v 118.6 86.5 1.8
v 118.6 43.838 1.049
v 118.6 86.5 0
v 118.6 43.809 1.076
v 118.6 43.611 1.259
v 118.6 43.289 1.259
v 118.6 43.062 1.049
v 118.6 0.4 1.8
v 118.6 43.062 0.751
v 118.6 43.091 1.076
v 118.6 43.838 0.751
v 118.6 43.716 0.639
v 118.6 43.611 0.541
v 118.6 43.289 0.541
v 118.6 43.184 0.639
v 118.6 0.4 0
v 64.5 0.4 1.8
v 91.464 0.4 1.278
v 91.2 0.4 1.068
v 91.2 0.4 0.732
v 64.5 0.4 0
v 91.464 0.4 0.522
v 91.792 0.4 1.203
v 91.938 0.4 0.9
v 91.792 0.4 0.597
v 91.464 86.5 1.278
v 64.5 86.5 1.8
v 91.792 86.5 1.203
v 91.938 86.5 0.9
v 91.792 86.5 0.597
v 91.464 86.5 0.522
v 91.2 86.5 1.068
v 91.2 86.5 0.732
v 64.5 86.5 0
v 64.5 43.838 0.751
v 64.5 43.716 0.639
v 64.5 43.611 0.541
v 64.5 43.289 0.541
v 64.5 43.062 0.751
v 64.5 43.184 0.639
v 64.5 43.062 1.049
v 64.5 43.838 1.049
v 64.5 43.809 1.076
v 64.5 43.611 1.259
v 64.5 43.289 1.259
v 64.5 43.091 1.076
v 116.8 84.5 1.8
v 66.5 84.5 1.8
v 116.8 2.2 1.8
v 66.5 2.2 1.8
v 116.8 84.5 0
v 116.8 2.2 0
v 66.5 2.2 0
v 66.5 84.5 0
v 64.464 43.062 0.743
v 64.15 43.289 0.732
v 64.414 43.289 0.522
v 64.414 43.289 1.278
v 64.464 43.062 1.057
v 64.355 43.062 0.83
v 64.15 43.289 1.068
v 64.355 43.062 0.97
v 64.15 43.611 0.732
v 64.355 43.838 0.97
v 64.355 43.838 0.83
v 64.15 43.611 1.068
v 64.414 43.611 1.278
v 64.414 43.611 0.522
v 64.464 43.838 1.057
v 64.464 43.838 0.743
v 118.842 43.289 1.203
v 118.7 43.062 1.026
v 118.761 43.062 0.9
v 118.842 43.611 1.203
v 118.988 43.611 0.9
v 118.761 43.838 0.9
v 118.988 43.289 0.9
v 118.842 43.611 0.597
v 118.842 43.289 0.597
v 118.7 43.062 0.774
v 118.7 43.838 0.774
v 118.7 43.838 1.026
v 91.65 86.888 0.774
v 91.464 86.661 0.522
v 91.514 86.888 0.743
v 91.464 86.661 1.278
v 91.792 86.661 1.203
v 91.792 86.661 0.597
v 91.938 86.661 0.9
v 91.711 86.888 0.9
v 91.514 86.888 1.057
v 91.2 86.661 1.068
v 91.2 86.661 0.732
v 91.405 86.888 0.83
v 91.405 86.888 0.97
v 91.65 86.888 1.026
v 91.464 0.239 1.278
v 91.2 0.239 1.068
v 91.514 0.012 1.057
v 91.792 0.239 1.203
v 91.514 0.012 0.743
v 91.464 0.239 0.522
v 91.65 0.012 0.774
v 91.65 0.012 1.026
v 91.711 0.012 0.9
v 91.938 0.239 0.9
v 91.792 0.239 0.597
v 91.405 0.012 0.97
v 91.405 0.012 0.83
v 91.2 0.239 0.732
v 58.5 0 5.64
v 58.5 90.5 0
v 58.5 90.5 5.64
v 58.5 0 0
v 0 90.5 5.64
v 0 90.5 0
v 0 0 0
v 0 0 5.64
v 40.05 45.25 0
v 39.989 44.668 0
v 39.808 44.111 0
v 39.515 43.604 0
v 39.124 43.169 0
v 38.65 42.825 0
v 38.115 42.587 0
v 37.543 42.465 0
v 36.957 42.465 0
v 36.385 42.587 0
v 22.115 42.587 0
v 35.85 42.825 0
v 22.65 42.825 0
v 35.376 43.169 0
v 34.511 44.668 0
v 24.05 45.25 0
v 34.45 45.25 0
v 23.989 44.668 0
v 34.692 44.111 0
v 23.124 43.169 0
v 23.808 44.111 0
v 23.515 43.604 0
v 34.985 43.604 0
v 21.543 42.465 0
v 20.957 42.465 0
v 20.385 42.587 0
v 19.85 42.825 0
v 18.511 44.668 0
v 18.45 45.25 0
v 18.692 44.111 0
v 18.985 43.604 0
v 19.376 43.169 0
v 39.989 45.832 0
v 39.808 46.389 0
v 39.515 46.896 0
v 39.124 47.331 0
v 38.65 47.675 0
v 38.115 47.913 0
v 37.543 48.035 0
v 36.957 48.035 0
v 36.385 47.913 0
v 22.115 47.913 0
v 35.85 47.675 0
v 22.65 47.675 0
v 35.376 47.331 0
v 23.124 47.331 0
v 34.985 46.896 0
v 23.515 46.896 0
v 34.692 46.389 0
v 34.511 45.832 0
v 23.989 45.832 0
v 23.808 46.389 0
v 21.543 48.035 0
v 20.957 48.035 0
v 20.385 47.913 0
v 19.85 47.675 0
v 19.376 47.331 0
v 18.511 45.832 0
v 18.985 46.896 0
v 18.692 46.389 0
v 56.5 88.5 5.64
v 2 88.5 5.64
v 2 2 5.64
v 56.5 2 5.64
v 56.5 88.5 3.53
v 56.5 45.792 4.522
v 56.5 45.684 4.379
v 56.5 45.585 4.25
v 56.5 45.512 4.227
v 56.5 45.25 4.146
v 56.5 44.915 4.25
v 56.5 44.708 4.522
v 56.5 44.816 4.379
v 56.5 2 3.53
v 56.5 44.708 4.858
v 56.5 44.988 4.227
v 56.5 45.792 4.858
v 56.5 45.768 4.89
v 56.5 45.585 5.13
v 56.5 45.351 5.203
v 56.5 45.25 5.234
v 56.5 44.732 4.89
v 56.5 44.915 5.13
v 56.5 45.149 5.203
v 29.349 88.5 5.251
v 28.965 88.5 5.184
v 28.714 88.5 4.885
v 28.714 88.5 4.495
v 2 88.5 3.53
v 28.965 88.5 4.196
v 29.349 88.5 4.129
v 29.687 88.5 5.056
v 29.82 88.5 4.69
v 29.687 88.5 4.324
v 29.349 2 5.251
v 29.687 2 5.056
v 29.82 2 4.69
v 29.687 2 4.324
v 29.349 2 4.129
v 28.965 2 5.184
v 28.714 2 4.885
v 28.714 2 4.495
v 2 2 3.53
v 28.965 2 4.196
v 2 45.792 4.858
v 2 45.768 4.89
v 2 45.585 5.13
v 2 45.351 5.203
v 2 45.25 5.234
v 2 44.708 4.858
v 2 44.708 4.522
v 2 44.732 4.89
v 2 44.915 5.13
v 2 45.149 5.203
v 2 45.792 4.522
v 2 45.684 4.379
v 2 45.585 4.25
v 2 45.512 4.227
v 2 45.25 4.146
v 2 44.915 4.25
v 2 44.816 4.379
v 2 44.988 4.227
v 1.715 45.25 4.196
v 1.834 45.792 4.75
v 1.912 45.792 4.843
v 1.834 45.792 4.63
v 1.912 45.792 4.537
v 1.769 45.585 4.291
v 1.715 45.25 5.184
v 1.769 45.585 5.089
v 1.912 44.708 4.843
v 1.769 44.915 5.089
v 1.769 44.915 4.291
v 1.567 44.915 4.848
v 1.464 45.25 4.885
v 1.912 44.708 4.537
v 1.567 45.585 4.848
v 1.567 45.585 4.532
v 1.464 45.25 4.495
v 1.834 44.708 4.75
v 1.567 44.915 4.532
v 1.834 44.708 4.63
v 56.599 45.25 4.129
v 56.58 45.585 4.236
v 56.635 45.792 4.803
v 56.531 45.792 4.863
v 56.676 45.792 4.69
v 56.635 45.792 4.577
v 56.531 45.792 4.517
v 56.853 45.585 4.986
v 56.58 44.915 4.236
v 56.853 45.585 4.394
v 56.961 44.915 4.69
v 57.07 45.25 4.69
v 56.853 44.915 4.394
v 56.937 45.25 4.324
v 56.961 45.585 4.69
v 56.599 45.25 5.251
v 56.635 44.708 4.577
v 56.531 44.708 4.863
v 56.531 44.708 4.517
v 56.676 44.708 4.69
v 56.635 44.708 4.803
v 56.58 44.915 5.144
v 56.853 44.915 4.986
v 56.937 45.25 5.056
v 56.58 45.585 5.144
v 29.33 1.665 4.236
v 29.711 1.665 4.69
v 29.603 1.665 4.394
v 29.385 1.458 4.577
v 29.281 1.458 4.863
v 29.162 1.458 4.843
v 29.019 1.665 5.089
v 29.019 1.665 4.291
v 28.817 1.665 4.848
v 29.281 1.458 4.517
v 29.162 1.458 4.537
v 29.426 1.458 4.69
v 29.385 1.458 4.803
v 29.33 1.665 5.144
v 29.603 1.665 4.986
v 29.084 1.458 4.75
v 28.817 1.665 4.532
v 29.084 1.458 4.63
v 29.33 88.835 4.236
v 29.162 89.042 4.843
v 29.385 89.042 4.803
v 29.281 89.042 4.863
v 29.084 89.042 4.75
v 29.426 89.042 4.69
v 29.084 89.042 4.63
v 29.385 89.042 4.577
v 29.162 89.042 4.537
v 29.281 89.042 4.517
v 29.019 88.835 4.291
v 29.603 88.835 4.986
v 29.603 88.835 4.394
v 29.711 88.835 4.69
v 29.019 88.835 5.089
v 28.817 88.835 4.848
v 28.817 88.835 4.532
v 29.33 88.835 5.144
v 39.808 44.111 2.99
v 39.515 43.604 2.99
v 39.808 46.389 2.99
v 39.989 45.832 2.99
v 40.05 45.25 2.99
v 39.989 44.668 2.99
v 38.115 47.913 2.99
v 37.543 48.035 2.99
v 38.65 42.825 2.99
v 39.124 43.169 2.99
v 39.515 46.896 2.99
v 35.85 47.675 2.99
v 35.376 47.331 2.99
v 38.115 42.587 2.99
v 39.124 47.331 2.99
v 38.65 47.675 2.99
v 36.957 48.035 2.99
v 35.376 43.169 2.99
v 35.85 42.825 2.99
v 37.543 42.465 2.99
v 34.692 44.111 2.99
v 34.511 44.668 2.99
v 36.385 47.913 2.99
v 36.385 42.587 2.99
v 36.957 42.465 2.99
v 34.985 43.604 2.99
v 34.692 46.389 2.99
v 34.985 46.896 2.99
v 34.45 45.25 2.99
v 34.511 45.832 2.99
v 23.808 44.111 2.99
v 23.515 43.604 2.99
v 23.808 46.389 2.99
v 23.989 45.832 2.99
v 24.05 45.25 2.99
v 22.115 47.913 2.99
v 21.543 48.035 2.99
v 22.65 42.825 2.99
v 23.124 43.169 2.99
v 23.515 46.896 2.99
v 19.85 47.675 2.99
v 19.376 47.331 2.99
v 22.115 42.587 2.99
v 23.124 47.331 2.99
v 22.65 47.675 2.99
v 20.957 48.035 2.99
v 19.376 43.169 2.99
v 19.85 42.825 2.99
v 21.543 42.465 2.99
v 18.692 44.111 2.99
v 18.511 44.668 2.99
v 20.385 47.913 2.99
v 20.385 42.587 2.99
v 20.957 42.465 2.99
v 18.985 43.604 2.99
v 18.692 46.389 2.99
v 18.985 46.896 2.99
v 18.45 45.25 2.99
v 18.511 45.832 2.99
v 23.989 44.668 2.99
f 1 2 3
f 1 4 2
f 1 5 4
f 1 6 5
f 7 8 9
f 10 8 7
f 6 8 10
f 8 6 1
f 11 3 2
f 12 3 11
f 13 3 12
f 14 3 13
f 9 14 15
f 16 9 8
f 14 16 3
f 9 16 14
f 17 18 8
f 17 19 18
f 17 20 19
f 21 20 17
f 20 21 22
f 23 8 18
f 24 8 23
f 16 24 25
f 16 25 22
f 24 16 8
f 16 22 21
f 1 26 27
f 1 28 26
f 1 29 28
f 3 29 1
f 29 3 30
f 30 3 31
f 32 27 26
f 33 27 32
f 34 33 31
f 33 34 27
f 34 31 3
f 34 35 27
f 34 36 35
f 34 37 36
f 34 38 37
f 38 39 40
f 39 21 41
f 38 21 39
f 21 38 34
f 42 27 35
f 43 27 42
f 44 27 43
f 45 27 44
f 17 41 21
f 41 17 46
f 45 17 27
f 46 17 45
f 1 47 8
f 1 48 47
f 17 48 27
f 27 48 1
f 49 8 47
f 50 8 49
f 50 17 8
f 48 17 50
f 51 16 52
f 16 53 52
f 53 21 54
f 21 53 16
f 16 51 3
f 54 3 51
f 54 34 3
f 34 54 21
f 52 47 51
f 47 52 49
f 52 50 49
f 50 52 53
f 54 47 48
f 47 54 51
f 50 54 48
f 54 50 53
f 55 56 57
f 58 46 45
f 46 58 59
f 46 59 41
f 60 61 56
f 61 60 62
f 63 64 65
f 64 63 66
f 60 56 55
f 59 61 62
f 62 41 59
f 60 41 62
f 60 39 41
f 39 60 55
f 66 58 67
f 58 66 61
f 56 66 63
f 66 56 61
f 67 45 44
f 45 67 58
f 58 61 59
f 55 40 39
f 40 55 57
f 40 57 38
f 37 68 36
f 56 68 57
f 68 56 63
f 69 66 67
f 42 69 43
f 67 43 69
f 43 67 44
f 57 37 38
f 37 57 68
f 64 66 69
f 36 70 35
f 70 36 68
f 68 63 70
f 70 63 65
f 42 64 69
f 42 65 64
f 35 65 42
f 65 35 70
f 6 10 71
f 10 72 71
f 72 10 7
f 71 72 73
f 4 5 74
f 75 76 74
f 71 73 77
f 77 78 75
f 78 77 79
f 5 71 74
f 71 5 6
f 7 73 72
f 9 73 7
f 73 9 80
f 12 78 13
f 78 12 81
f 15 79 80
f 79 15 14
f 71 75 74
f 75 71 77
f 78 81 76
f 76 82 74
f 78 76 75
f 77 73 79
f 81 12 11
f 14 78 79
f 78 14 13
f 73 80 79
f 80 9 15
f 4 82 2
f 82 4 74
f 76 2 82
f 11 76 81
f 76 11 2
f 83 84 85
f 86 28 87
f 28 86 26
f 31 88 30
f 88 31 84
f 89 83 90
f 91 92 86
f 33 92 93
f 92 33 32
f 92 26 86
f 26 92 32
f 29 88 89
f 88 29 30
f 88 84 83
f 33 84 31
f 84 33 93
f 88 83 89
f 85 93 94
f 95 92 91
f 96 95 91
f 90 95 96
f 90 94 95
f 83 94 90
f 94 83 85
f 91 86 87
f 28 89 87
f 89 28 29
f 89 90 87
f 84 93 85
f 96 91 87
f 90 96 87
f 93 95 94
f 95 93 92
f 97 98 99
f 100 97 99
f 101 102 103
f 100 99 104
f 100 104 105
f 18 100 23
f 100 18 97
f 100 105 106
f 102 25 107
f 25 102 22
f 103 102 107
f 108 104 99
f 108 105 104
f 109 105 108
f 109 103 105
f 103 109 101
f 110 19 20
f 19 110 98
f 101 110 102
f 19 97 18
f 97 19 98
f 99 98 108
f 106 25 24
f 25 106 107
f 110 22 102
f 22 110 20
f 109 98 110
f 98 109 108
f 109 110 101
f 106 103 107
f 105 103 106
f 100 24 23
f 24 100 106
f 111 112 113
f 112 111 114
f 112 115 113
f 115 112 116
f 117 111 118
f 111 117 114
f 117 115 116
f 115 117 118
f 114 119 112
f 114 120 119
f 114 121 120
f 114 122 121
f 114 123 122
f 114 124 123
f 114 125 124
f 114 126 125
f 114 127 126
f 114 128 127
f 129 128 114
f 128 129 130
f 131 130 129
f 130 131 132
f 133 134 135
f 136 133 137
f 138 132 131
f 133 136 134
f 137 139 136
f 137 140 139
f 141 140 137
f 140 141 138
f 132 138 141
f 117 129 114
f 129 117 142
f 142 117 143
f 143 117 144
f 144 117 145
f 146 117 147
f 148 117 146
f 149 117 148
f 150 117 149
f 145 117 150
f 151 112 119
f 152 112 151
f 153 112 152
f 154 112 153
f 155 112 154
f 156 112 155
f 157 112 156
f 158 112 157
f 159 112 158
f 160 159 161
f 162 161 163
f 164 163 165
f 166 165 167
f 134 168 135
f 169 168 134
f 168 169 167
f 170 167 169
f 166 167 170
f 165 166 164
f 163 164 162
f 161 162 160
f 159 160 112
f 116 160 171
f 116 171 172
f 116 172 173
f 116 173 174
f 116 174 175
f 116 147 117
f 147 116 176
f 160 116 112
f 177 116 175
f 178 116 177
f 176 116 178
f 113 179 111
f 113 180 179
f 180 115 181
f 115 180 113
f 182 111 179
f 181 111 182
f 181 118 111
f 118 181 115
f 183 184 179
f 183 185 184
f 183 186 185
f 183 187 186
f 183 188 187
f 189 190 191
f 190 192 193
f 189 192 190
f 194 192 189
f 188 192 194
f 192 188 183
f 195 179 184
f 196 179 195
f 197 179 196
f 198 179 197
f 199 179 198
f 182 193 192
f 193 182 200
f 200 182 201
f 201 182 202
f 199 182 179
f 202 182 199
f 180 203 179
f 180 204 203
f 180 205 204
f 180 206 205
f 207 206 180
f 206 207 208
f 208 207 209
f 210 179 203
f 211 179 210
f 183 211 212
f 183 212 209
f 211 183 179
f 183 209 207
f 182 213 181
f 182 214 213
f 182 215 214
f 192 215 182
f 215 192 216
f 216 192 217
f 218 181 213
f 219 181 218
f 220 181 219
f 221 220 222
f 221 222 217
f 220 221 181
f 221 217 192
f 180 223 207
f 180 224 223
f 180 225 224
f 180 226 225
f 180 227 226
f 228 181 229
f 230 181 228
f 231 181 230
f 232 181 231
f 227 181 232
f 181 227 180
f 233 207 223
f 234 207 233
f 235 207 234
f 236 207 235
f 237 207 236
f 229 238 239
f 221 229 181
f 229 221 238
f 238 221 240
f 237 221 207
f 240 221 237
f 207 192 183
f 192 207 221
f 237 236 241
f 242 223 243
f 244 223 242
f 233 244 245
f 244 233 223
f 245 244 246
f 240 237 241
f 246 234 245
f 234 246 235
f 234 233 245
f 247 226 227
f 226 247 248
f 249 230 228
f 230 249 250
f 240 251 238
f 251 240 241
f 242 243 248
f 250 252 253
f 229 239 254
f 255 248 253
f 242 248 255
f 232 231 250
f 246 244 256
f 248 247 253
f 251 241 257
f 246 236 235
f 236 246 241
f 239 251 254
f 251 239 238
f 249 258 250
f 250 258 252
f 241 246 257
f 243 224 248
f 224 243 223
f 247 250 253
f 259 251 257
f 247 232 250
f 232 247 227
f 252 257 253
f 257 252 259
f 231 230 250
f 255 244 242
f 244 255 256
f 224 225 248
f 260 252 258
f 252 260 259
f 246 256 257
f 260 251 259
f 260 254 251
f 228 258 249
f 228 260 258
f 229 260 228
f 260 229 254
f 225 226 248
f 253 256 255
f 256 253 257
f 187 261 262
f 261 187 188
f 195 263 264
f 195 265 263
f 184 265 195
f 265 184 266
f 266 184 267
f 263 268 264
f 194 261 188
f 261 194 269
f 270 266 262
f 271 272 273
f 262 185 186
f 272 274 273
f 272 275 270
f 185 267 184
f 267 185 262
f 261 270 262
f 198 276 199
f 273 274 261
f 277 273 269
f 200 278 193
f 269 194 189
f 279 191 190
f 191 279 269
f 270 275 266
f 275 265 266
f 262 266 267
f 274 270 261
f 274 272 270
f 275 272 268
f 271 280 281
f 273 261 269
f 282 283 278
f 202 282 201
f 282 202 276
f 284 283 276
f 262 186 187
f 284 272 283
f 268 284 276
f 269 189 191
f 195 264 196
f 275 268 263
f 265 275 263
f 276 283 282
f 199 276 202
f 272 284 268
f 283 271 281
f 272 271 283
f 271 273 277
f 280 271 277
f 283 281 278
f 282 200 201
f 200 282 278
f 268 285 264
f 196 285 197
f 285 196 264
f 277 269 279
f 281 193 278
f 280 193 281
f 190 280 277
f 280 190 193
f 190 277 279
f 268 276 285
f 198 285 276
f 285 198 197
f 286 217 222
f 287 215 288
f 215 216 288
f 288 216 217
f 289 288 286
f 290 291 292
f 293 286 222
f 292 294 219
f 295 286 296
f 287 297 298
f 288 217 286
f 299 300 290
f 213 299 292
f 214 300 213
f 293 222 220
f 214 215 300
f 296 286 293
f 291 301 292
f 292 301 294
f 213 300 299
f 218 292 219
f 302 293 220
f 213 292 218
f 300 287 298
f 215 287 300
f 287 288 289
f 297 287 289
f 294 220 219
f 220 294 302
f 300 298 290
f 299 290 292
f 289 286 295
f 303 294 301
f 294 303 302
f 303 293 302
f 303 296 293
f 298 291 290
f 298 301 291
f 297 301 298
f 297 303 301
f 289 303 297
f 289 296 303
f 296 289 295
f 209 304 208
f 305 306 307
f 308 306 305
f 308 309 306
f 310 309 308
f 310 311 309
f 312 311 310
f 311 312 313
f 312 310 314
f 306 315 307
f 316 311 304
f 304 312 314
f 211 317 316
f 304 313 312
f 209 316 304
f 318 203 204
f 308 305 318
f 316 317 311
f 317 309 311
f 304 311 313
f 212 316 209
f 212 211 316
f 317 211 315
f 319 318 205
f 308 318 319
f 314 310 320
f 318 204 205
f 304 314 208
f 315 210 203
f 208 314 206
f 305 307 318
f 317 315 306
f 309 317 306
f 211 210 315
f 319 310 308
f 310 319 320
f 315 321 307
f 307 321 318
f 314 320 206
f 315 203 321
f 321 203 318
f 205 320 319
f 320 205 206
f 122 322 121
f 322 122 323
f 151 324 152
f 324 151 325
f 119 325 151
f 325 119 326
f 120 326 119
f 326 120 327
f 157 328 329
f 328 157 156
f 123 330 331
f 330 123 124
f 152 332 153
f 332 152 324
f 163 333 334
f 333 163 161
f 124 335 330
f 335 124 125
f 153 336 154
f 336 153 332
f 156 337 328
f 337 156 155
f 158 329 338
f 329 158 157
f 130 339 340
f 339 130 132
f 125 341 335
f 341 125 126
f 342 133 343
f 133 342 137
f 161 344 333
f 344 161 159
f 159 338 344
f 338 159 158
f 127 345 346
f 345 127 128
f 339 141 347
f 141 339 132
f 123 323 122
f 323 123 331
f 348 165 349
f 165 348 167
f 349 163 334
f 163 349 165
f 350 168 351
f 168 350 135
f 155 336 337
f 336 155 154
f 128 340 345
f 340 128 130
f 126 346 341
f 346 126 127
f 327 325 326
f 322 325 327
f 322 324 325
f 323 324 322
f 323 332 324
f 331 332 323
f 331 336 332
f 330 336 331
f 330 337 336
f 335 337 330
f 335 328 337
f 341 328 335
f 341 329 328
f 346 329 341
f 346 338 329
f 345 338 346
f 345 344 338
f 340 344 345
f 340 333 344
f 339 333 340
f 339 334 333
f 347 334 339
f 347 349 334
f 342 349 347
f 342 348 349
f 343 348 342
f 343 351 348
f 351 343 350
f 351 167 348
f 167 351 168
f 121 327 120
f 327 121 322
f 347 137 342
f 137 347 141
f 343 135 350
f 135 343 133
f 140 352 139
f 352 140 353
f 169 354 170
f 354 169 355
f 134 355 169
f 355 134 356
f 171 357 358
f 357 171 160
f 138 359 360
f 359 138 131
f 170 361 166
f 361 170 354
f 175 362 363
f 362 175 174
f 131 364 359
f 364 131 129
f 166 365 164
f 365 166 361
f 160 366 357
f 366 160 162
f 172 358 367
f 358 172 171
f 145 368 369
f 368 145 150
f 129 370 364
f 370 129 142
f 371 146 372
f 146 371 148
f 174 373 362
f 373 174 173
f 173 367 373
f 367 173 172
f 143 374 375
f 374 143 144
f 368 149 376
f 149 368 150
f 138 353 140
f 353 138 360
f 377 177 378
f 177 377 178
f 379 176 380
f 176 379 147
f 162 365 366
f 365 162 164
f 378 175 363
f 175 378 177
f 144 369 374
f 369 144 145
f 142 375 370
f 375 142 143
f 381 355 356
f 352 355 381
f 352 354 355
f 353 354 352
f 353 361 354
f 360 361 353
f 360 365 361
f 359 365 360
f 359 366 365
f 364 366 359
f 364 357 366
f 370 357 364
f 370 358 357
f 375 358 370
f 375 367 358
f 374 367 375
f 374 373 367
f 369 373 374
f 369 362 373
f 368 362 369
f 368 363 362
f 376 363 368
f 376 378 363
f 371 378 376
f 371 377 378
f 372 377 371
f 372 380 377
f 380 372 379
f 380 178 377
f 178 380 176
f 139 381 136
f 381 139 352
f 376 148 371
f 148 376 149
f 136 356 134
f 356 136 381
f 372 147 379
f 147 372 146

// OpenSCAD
$fs = .4;

front_depth = 2;
back_depth = 5.64;

picture_thickness = .1;
clearance = .2;
tab_padding = 2.5;



module front(picture_width, picture_height, border = 2) {
    difference() {
        cube([picture_width-clearance*2, front_depth-2*picture_thickness, picture_height-clearance*2]);
        translate([border, -.01, border])
            cube([picture_width - border*2-clearance, front_depth+.02, picture_height - border*2-clearance]);
    }
    module tab_sphere() {
        sphere(d = back_depth - front_depth - tab_padding - .3);
    }
    module tabs() {
        translate([0, front_depth/2-picture_thickness, picture_height/2-clearance]) tab_sphere();
        translate([picture_width-clearance*2, front_depth/2-picture_thickness, picture_height/2-clearance]) tab_sphere();
        translate([picture_width/2-clearance, front_depth/2-picture_thickness, 0]) tab_sphere();
        translate([picture_width/2-clearance, front_depth/2-picture_thickness, picture_height-clearance*2]) tab_sphere();
    }
    tabs();
}

back_border = 2;

module back(picture_width, picture_height) {
    module frame() {
        difference() {
            cube([picture_width+back_border*2, back_depth, picture_height+back_border*2]);
            translate([back_border, -.01, back_border])
                cube([picture_width, front_depth+picture_thickness+.02, picture_height]);
        }
    }
    module tab_sphere() {
        sphere(d = back_depth - front_depth - tab_padding);
    }
    module tab_slots() {
        translate([back_border, (front_depth+picture_thickness)/2, picture_height/2+back_border]) tab_sphere();
        translate([picture_width + back_border, (front_depth+picture_thickness)/2, picture_height/2+back_border]) tab_sphere();
        translate([picture_width/2+back_border, (front_depth+picture_thickness)/2, back_border]) tab_sphere();
        translate([picture_width/2+back_border, (front_depth+picture_thickness)/2, picture_height+back_border]) tab_sphere();
    }
    module magnet_hole() {
        rotate([90, 0, 0]) 
        cylinder(h = 3, d = 5.6, center = false);
    }
    difference() {
        frame();
        translate([0, -picture_thickness, 0]) tab_slots();
        translate([picture_width/2+back_border+8, back_depth+.01, picture_height/2+back_border])
            magnet_hole();
        translate([picture_width/2+back_border-8, back_depth+.01, picture_height/2+back_border])
            magnet_hole();
    }
}



picture_width = 54.5;
picture_height = 86.5;


translate([picture_width + 10, picture_height, 0]) rotate([90,0,0]) color("red", 1) front(picture_width, picture_height);
translate([0, 0, back_depth]) rotate([-90,0,0]) back(picture_width, picture_height);
